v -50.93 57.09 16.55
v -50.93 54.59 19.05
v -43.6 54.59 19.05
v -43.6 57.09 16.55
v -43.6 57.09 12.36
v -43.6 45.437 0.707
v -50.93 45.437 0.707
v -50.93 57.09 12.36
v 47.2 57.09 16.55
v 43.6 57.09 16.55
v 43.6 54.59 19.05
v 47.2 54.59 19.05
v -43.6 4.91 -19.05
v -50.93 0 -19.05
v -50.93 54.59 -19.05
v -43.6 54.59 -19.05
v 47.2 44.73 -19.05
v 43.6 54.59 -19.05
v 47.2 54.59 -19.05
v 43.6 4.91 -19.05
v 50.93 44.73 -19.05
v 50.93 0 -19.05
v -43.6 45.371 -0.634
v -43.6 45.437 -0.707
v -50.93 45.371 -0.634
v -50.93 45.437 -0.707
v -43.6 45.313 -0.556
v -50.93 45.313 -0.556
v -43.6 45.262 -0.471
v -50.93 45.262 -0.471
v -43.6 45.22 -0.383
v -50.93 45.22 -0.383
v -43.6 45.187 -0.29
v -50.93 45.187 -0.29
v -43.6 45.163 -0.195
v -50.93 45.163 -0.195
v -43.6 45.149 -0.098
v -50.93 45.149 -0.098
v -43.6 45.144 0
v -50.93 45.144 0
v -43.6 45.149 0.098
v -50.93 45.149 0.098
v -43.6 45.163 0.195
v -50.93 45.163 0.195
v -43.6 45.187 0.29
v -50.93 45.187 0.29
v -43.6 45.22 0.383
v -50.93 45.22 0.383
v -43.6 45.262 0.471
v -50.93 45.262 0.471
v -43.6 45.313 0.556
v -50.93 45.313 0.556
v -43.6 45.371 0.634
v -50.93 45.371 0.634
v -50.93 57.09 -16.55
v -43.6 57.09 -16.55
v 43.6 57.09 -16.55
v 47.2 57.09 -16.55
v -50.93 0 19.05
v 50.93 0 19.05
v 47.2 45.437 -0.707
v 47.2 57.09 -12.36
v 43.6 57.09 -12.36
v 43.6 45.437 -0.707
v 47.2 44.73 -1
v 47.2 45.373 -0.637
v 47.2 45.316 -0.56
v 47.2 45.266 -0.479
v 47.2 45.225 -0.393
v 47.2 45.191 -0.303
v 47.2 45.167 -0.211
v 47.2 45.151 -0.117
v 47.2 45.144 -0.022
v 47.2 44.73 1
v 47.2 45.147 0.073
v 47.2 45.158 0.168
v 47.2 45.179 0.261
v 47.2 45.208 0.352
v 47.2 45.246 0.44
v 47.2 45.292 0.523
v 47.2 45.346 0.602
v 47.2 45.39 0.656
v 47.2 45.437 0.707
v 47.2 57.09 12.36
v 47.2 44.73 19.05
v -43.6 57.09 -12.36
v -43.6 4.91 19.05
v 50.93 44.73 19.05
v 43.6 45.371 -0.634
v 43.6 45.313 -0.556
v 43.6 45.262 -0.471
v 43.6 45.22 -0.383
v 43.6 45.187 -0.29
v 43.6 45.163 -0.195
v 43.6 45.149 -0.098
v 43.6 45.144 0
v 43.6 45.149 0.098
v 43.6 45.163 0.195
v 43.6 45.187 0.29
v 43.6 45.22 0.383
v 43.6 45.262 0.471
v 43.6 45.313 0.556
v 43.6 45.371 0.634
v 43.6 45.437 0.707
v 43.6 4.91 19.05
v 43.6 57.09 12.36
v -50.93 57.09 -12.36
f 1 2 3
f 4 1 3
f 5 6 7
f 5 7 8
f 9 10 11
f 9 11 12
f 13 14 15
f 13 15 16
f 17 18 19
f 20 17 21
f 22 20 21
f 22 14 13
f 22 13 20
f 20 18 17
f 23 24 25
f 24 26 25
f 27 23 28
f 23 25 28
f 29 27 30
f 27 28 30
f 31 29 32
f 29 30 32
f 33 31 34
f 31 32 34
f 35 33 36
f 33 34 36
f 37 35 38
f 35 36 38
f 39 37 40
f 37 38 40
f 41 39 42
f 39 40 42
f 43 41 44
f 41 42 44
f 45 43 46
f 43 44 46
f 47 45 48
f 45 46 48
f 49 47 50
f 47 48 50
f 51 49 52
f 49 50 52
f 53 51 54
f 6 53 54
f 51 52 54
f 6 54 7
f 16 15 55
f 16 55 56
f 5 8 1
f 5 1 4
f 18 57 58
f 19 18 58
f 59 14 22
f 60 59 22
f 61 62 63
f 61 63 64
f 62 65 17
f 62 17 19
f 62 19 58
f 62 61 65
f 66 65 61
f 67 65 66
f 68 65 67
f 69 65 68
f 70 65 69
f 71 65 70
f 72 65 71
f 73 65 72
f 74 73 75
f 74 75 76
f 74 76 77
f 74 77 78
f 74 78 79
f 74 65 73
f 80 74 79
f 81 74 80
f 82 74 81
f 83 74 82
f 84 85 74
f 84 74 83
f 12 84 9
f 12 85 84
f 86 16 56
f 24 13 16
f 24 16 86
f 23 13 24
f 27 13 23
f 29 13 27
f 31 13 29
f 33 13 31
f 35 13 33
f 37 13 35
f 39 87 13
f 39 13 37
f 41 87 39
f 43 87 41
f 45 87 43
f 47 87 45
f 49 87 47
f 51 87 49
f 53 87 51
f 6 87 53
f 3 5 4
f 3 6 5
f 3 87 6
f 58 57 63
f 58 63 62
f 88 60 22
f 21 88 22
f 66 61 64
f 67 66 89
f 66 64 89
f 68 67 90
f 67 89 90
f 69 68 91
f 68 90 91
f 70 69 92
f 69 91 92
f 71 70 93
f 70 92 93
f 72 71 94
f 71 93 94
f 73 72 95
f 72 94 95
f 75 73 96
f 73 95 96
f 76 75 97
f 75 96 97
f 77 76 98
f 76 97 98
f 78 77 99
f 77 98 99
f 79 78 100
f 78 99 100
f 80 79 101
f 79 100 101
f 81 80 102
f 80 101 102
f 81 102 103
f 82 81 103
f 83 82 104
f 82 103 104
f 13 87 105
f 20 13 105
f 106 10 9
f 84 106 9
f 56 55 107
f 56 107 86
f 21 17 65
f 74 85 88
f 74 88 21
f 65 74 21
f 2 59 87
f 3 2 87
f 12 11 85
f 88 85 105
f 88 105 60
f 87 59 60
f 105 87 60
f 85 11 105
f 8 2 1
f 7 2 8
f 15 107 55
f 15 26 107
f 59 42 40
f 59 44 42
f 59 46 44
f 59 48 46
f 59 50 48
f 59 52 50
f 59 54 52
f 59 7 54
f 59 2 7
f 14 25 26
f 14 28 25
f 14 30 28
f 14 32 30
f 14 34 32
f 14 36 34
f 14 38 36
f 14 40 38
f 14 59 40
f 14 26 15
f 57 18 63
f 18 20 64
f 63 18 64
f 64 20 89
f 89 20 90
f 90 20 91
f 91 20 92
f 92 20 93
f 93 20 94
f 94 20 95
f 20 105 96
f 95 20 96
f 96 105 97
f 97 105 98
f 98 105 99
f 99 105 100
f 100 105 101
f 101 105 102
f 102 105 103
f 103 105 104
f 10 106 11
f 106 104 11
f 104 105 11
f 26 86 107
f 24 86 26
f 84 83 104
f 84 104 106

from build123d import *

# Parameters (mm, degrees)
ESBO_O1_W                = 101.86
ESBO_O1_H                = 38.1
RESSALTO_EXTRUS_O1_DEPTH = 57.09
ESBO_O2_W                = 87.2
ESBO_O2_H                = 52.18
CORTE_EXTRUS_O1_DEPTH    = 57.09
ESBO_O4_W                = 3.73
ESBO_O4_H                = 12.36
CORTE_EXTRUS_O2_DEPTH    = 57.09
CORTE_EXTRUS_O3_DEPTH    = 1000
FILETE1_R                = 1
CHANFRO1_SIZE            = 2.5


with BuildPart() as part:
    # Esboço1 → Ressalto-extrusão1 (new body)
    with BuildSketch(Plane(origin=(0, 0, 0), x_dir=(1, 0, 0), z_dir=(0, 1, 0))):
        Rectangle(ESBO_O1_W, ESBO_O1_H)
    extrude(amount=RESSALTO_EXTRUS_O1_DEPTH)

    # Esboço2 → Corte-extrusão1 (cut)
    with BuildSketch(Plane.XY.offset(19.05)):
        with Locations((0, 31)):
            Rectangle(ESBO_O2_W, ESBO_O2_H)
    extrude(amount=-CORTE_EXTRUS_O1_DEPTH, mode=Mode.SUBTRACT)

    # Esboço4 → Corte-extrusão2 (cut)
    with BuildSketch(Plane.XY.offset(19.05)):
        with Locations((49.065, 50.91)):
            Rectangle(ESBO_O4_W, ESBO_O4_H)
    extrude(amount=-CORTE_EXTRUS_O2_DEPTH, mode=Mode.SUBTRACT)

    # Esboço5 → Corte-extrusão3 (cut)
    with BuildSketch(Plane(origin=(47.2, 0, 0), x_dir=(0, 0, -1), z_dir=(1, 0, 0))):
        Polygon((0, 44.73), (-12.36, 57.09), (12.36, 57.09), align=None)
    extrude(amount=-CORTE_EXTRUS_O3_DEPTH, mode=Mode.SUBTRACT)

    # Filete1
    filete1_edges = [part.edges().sort_by_distance(p)[0] for p in [
        (-47.265, 44.73, 0),
        (45.4, 44.73, 0),
    ]]
    fillet(filete1_edges, radius=FILETE1_R)

    # Chanfro1
    chanfro1_edges = [part.edges().sort_by_distance(p)[0] for p in [
        (45.4, 57.09, 19.05),
        (-47.265, 57.09, -19.05),
        (45.4, 57.09, -19.05),
        (-47.265, 57.09, 19.05),
    ]]
    chamfer(chanfro1_edges, length=CHANFRO1_SIZE)


solid = part.part
